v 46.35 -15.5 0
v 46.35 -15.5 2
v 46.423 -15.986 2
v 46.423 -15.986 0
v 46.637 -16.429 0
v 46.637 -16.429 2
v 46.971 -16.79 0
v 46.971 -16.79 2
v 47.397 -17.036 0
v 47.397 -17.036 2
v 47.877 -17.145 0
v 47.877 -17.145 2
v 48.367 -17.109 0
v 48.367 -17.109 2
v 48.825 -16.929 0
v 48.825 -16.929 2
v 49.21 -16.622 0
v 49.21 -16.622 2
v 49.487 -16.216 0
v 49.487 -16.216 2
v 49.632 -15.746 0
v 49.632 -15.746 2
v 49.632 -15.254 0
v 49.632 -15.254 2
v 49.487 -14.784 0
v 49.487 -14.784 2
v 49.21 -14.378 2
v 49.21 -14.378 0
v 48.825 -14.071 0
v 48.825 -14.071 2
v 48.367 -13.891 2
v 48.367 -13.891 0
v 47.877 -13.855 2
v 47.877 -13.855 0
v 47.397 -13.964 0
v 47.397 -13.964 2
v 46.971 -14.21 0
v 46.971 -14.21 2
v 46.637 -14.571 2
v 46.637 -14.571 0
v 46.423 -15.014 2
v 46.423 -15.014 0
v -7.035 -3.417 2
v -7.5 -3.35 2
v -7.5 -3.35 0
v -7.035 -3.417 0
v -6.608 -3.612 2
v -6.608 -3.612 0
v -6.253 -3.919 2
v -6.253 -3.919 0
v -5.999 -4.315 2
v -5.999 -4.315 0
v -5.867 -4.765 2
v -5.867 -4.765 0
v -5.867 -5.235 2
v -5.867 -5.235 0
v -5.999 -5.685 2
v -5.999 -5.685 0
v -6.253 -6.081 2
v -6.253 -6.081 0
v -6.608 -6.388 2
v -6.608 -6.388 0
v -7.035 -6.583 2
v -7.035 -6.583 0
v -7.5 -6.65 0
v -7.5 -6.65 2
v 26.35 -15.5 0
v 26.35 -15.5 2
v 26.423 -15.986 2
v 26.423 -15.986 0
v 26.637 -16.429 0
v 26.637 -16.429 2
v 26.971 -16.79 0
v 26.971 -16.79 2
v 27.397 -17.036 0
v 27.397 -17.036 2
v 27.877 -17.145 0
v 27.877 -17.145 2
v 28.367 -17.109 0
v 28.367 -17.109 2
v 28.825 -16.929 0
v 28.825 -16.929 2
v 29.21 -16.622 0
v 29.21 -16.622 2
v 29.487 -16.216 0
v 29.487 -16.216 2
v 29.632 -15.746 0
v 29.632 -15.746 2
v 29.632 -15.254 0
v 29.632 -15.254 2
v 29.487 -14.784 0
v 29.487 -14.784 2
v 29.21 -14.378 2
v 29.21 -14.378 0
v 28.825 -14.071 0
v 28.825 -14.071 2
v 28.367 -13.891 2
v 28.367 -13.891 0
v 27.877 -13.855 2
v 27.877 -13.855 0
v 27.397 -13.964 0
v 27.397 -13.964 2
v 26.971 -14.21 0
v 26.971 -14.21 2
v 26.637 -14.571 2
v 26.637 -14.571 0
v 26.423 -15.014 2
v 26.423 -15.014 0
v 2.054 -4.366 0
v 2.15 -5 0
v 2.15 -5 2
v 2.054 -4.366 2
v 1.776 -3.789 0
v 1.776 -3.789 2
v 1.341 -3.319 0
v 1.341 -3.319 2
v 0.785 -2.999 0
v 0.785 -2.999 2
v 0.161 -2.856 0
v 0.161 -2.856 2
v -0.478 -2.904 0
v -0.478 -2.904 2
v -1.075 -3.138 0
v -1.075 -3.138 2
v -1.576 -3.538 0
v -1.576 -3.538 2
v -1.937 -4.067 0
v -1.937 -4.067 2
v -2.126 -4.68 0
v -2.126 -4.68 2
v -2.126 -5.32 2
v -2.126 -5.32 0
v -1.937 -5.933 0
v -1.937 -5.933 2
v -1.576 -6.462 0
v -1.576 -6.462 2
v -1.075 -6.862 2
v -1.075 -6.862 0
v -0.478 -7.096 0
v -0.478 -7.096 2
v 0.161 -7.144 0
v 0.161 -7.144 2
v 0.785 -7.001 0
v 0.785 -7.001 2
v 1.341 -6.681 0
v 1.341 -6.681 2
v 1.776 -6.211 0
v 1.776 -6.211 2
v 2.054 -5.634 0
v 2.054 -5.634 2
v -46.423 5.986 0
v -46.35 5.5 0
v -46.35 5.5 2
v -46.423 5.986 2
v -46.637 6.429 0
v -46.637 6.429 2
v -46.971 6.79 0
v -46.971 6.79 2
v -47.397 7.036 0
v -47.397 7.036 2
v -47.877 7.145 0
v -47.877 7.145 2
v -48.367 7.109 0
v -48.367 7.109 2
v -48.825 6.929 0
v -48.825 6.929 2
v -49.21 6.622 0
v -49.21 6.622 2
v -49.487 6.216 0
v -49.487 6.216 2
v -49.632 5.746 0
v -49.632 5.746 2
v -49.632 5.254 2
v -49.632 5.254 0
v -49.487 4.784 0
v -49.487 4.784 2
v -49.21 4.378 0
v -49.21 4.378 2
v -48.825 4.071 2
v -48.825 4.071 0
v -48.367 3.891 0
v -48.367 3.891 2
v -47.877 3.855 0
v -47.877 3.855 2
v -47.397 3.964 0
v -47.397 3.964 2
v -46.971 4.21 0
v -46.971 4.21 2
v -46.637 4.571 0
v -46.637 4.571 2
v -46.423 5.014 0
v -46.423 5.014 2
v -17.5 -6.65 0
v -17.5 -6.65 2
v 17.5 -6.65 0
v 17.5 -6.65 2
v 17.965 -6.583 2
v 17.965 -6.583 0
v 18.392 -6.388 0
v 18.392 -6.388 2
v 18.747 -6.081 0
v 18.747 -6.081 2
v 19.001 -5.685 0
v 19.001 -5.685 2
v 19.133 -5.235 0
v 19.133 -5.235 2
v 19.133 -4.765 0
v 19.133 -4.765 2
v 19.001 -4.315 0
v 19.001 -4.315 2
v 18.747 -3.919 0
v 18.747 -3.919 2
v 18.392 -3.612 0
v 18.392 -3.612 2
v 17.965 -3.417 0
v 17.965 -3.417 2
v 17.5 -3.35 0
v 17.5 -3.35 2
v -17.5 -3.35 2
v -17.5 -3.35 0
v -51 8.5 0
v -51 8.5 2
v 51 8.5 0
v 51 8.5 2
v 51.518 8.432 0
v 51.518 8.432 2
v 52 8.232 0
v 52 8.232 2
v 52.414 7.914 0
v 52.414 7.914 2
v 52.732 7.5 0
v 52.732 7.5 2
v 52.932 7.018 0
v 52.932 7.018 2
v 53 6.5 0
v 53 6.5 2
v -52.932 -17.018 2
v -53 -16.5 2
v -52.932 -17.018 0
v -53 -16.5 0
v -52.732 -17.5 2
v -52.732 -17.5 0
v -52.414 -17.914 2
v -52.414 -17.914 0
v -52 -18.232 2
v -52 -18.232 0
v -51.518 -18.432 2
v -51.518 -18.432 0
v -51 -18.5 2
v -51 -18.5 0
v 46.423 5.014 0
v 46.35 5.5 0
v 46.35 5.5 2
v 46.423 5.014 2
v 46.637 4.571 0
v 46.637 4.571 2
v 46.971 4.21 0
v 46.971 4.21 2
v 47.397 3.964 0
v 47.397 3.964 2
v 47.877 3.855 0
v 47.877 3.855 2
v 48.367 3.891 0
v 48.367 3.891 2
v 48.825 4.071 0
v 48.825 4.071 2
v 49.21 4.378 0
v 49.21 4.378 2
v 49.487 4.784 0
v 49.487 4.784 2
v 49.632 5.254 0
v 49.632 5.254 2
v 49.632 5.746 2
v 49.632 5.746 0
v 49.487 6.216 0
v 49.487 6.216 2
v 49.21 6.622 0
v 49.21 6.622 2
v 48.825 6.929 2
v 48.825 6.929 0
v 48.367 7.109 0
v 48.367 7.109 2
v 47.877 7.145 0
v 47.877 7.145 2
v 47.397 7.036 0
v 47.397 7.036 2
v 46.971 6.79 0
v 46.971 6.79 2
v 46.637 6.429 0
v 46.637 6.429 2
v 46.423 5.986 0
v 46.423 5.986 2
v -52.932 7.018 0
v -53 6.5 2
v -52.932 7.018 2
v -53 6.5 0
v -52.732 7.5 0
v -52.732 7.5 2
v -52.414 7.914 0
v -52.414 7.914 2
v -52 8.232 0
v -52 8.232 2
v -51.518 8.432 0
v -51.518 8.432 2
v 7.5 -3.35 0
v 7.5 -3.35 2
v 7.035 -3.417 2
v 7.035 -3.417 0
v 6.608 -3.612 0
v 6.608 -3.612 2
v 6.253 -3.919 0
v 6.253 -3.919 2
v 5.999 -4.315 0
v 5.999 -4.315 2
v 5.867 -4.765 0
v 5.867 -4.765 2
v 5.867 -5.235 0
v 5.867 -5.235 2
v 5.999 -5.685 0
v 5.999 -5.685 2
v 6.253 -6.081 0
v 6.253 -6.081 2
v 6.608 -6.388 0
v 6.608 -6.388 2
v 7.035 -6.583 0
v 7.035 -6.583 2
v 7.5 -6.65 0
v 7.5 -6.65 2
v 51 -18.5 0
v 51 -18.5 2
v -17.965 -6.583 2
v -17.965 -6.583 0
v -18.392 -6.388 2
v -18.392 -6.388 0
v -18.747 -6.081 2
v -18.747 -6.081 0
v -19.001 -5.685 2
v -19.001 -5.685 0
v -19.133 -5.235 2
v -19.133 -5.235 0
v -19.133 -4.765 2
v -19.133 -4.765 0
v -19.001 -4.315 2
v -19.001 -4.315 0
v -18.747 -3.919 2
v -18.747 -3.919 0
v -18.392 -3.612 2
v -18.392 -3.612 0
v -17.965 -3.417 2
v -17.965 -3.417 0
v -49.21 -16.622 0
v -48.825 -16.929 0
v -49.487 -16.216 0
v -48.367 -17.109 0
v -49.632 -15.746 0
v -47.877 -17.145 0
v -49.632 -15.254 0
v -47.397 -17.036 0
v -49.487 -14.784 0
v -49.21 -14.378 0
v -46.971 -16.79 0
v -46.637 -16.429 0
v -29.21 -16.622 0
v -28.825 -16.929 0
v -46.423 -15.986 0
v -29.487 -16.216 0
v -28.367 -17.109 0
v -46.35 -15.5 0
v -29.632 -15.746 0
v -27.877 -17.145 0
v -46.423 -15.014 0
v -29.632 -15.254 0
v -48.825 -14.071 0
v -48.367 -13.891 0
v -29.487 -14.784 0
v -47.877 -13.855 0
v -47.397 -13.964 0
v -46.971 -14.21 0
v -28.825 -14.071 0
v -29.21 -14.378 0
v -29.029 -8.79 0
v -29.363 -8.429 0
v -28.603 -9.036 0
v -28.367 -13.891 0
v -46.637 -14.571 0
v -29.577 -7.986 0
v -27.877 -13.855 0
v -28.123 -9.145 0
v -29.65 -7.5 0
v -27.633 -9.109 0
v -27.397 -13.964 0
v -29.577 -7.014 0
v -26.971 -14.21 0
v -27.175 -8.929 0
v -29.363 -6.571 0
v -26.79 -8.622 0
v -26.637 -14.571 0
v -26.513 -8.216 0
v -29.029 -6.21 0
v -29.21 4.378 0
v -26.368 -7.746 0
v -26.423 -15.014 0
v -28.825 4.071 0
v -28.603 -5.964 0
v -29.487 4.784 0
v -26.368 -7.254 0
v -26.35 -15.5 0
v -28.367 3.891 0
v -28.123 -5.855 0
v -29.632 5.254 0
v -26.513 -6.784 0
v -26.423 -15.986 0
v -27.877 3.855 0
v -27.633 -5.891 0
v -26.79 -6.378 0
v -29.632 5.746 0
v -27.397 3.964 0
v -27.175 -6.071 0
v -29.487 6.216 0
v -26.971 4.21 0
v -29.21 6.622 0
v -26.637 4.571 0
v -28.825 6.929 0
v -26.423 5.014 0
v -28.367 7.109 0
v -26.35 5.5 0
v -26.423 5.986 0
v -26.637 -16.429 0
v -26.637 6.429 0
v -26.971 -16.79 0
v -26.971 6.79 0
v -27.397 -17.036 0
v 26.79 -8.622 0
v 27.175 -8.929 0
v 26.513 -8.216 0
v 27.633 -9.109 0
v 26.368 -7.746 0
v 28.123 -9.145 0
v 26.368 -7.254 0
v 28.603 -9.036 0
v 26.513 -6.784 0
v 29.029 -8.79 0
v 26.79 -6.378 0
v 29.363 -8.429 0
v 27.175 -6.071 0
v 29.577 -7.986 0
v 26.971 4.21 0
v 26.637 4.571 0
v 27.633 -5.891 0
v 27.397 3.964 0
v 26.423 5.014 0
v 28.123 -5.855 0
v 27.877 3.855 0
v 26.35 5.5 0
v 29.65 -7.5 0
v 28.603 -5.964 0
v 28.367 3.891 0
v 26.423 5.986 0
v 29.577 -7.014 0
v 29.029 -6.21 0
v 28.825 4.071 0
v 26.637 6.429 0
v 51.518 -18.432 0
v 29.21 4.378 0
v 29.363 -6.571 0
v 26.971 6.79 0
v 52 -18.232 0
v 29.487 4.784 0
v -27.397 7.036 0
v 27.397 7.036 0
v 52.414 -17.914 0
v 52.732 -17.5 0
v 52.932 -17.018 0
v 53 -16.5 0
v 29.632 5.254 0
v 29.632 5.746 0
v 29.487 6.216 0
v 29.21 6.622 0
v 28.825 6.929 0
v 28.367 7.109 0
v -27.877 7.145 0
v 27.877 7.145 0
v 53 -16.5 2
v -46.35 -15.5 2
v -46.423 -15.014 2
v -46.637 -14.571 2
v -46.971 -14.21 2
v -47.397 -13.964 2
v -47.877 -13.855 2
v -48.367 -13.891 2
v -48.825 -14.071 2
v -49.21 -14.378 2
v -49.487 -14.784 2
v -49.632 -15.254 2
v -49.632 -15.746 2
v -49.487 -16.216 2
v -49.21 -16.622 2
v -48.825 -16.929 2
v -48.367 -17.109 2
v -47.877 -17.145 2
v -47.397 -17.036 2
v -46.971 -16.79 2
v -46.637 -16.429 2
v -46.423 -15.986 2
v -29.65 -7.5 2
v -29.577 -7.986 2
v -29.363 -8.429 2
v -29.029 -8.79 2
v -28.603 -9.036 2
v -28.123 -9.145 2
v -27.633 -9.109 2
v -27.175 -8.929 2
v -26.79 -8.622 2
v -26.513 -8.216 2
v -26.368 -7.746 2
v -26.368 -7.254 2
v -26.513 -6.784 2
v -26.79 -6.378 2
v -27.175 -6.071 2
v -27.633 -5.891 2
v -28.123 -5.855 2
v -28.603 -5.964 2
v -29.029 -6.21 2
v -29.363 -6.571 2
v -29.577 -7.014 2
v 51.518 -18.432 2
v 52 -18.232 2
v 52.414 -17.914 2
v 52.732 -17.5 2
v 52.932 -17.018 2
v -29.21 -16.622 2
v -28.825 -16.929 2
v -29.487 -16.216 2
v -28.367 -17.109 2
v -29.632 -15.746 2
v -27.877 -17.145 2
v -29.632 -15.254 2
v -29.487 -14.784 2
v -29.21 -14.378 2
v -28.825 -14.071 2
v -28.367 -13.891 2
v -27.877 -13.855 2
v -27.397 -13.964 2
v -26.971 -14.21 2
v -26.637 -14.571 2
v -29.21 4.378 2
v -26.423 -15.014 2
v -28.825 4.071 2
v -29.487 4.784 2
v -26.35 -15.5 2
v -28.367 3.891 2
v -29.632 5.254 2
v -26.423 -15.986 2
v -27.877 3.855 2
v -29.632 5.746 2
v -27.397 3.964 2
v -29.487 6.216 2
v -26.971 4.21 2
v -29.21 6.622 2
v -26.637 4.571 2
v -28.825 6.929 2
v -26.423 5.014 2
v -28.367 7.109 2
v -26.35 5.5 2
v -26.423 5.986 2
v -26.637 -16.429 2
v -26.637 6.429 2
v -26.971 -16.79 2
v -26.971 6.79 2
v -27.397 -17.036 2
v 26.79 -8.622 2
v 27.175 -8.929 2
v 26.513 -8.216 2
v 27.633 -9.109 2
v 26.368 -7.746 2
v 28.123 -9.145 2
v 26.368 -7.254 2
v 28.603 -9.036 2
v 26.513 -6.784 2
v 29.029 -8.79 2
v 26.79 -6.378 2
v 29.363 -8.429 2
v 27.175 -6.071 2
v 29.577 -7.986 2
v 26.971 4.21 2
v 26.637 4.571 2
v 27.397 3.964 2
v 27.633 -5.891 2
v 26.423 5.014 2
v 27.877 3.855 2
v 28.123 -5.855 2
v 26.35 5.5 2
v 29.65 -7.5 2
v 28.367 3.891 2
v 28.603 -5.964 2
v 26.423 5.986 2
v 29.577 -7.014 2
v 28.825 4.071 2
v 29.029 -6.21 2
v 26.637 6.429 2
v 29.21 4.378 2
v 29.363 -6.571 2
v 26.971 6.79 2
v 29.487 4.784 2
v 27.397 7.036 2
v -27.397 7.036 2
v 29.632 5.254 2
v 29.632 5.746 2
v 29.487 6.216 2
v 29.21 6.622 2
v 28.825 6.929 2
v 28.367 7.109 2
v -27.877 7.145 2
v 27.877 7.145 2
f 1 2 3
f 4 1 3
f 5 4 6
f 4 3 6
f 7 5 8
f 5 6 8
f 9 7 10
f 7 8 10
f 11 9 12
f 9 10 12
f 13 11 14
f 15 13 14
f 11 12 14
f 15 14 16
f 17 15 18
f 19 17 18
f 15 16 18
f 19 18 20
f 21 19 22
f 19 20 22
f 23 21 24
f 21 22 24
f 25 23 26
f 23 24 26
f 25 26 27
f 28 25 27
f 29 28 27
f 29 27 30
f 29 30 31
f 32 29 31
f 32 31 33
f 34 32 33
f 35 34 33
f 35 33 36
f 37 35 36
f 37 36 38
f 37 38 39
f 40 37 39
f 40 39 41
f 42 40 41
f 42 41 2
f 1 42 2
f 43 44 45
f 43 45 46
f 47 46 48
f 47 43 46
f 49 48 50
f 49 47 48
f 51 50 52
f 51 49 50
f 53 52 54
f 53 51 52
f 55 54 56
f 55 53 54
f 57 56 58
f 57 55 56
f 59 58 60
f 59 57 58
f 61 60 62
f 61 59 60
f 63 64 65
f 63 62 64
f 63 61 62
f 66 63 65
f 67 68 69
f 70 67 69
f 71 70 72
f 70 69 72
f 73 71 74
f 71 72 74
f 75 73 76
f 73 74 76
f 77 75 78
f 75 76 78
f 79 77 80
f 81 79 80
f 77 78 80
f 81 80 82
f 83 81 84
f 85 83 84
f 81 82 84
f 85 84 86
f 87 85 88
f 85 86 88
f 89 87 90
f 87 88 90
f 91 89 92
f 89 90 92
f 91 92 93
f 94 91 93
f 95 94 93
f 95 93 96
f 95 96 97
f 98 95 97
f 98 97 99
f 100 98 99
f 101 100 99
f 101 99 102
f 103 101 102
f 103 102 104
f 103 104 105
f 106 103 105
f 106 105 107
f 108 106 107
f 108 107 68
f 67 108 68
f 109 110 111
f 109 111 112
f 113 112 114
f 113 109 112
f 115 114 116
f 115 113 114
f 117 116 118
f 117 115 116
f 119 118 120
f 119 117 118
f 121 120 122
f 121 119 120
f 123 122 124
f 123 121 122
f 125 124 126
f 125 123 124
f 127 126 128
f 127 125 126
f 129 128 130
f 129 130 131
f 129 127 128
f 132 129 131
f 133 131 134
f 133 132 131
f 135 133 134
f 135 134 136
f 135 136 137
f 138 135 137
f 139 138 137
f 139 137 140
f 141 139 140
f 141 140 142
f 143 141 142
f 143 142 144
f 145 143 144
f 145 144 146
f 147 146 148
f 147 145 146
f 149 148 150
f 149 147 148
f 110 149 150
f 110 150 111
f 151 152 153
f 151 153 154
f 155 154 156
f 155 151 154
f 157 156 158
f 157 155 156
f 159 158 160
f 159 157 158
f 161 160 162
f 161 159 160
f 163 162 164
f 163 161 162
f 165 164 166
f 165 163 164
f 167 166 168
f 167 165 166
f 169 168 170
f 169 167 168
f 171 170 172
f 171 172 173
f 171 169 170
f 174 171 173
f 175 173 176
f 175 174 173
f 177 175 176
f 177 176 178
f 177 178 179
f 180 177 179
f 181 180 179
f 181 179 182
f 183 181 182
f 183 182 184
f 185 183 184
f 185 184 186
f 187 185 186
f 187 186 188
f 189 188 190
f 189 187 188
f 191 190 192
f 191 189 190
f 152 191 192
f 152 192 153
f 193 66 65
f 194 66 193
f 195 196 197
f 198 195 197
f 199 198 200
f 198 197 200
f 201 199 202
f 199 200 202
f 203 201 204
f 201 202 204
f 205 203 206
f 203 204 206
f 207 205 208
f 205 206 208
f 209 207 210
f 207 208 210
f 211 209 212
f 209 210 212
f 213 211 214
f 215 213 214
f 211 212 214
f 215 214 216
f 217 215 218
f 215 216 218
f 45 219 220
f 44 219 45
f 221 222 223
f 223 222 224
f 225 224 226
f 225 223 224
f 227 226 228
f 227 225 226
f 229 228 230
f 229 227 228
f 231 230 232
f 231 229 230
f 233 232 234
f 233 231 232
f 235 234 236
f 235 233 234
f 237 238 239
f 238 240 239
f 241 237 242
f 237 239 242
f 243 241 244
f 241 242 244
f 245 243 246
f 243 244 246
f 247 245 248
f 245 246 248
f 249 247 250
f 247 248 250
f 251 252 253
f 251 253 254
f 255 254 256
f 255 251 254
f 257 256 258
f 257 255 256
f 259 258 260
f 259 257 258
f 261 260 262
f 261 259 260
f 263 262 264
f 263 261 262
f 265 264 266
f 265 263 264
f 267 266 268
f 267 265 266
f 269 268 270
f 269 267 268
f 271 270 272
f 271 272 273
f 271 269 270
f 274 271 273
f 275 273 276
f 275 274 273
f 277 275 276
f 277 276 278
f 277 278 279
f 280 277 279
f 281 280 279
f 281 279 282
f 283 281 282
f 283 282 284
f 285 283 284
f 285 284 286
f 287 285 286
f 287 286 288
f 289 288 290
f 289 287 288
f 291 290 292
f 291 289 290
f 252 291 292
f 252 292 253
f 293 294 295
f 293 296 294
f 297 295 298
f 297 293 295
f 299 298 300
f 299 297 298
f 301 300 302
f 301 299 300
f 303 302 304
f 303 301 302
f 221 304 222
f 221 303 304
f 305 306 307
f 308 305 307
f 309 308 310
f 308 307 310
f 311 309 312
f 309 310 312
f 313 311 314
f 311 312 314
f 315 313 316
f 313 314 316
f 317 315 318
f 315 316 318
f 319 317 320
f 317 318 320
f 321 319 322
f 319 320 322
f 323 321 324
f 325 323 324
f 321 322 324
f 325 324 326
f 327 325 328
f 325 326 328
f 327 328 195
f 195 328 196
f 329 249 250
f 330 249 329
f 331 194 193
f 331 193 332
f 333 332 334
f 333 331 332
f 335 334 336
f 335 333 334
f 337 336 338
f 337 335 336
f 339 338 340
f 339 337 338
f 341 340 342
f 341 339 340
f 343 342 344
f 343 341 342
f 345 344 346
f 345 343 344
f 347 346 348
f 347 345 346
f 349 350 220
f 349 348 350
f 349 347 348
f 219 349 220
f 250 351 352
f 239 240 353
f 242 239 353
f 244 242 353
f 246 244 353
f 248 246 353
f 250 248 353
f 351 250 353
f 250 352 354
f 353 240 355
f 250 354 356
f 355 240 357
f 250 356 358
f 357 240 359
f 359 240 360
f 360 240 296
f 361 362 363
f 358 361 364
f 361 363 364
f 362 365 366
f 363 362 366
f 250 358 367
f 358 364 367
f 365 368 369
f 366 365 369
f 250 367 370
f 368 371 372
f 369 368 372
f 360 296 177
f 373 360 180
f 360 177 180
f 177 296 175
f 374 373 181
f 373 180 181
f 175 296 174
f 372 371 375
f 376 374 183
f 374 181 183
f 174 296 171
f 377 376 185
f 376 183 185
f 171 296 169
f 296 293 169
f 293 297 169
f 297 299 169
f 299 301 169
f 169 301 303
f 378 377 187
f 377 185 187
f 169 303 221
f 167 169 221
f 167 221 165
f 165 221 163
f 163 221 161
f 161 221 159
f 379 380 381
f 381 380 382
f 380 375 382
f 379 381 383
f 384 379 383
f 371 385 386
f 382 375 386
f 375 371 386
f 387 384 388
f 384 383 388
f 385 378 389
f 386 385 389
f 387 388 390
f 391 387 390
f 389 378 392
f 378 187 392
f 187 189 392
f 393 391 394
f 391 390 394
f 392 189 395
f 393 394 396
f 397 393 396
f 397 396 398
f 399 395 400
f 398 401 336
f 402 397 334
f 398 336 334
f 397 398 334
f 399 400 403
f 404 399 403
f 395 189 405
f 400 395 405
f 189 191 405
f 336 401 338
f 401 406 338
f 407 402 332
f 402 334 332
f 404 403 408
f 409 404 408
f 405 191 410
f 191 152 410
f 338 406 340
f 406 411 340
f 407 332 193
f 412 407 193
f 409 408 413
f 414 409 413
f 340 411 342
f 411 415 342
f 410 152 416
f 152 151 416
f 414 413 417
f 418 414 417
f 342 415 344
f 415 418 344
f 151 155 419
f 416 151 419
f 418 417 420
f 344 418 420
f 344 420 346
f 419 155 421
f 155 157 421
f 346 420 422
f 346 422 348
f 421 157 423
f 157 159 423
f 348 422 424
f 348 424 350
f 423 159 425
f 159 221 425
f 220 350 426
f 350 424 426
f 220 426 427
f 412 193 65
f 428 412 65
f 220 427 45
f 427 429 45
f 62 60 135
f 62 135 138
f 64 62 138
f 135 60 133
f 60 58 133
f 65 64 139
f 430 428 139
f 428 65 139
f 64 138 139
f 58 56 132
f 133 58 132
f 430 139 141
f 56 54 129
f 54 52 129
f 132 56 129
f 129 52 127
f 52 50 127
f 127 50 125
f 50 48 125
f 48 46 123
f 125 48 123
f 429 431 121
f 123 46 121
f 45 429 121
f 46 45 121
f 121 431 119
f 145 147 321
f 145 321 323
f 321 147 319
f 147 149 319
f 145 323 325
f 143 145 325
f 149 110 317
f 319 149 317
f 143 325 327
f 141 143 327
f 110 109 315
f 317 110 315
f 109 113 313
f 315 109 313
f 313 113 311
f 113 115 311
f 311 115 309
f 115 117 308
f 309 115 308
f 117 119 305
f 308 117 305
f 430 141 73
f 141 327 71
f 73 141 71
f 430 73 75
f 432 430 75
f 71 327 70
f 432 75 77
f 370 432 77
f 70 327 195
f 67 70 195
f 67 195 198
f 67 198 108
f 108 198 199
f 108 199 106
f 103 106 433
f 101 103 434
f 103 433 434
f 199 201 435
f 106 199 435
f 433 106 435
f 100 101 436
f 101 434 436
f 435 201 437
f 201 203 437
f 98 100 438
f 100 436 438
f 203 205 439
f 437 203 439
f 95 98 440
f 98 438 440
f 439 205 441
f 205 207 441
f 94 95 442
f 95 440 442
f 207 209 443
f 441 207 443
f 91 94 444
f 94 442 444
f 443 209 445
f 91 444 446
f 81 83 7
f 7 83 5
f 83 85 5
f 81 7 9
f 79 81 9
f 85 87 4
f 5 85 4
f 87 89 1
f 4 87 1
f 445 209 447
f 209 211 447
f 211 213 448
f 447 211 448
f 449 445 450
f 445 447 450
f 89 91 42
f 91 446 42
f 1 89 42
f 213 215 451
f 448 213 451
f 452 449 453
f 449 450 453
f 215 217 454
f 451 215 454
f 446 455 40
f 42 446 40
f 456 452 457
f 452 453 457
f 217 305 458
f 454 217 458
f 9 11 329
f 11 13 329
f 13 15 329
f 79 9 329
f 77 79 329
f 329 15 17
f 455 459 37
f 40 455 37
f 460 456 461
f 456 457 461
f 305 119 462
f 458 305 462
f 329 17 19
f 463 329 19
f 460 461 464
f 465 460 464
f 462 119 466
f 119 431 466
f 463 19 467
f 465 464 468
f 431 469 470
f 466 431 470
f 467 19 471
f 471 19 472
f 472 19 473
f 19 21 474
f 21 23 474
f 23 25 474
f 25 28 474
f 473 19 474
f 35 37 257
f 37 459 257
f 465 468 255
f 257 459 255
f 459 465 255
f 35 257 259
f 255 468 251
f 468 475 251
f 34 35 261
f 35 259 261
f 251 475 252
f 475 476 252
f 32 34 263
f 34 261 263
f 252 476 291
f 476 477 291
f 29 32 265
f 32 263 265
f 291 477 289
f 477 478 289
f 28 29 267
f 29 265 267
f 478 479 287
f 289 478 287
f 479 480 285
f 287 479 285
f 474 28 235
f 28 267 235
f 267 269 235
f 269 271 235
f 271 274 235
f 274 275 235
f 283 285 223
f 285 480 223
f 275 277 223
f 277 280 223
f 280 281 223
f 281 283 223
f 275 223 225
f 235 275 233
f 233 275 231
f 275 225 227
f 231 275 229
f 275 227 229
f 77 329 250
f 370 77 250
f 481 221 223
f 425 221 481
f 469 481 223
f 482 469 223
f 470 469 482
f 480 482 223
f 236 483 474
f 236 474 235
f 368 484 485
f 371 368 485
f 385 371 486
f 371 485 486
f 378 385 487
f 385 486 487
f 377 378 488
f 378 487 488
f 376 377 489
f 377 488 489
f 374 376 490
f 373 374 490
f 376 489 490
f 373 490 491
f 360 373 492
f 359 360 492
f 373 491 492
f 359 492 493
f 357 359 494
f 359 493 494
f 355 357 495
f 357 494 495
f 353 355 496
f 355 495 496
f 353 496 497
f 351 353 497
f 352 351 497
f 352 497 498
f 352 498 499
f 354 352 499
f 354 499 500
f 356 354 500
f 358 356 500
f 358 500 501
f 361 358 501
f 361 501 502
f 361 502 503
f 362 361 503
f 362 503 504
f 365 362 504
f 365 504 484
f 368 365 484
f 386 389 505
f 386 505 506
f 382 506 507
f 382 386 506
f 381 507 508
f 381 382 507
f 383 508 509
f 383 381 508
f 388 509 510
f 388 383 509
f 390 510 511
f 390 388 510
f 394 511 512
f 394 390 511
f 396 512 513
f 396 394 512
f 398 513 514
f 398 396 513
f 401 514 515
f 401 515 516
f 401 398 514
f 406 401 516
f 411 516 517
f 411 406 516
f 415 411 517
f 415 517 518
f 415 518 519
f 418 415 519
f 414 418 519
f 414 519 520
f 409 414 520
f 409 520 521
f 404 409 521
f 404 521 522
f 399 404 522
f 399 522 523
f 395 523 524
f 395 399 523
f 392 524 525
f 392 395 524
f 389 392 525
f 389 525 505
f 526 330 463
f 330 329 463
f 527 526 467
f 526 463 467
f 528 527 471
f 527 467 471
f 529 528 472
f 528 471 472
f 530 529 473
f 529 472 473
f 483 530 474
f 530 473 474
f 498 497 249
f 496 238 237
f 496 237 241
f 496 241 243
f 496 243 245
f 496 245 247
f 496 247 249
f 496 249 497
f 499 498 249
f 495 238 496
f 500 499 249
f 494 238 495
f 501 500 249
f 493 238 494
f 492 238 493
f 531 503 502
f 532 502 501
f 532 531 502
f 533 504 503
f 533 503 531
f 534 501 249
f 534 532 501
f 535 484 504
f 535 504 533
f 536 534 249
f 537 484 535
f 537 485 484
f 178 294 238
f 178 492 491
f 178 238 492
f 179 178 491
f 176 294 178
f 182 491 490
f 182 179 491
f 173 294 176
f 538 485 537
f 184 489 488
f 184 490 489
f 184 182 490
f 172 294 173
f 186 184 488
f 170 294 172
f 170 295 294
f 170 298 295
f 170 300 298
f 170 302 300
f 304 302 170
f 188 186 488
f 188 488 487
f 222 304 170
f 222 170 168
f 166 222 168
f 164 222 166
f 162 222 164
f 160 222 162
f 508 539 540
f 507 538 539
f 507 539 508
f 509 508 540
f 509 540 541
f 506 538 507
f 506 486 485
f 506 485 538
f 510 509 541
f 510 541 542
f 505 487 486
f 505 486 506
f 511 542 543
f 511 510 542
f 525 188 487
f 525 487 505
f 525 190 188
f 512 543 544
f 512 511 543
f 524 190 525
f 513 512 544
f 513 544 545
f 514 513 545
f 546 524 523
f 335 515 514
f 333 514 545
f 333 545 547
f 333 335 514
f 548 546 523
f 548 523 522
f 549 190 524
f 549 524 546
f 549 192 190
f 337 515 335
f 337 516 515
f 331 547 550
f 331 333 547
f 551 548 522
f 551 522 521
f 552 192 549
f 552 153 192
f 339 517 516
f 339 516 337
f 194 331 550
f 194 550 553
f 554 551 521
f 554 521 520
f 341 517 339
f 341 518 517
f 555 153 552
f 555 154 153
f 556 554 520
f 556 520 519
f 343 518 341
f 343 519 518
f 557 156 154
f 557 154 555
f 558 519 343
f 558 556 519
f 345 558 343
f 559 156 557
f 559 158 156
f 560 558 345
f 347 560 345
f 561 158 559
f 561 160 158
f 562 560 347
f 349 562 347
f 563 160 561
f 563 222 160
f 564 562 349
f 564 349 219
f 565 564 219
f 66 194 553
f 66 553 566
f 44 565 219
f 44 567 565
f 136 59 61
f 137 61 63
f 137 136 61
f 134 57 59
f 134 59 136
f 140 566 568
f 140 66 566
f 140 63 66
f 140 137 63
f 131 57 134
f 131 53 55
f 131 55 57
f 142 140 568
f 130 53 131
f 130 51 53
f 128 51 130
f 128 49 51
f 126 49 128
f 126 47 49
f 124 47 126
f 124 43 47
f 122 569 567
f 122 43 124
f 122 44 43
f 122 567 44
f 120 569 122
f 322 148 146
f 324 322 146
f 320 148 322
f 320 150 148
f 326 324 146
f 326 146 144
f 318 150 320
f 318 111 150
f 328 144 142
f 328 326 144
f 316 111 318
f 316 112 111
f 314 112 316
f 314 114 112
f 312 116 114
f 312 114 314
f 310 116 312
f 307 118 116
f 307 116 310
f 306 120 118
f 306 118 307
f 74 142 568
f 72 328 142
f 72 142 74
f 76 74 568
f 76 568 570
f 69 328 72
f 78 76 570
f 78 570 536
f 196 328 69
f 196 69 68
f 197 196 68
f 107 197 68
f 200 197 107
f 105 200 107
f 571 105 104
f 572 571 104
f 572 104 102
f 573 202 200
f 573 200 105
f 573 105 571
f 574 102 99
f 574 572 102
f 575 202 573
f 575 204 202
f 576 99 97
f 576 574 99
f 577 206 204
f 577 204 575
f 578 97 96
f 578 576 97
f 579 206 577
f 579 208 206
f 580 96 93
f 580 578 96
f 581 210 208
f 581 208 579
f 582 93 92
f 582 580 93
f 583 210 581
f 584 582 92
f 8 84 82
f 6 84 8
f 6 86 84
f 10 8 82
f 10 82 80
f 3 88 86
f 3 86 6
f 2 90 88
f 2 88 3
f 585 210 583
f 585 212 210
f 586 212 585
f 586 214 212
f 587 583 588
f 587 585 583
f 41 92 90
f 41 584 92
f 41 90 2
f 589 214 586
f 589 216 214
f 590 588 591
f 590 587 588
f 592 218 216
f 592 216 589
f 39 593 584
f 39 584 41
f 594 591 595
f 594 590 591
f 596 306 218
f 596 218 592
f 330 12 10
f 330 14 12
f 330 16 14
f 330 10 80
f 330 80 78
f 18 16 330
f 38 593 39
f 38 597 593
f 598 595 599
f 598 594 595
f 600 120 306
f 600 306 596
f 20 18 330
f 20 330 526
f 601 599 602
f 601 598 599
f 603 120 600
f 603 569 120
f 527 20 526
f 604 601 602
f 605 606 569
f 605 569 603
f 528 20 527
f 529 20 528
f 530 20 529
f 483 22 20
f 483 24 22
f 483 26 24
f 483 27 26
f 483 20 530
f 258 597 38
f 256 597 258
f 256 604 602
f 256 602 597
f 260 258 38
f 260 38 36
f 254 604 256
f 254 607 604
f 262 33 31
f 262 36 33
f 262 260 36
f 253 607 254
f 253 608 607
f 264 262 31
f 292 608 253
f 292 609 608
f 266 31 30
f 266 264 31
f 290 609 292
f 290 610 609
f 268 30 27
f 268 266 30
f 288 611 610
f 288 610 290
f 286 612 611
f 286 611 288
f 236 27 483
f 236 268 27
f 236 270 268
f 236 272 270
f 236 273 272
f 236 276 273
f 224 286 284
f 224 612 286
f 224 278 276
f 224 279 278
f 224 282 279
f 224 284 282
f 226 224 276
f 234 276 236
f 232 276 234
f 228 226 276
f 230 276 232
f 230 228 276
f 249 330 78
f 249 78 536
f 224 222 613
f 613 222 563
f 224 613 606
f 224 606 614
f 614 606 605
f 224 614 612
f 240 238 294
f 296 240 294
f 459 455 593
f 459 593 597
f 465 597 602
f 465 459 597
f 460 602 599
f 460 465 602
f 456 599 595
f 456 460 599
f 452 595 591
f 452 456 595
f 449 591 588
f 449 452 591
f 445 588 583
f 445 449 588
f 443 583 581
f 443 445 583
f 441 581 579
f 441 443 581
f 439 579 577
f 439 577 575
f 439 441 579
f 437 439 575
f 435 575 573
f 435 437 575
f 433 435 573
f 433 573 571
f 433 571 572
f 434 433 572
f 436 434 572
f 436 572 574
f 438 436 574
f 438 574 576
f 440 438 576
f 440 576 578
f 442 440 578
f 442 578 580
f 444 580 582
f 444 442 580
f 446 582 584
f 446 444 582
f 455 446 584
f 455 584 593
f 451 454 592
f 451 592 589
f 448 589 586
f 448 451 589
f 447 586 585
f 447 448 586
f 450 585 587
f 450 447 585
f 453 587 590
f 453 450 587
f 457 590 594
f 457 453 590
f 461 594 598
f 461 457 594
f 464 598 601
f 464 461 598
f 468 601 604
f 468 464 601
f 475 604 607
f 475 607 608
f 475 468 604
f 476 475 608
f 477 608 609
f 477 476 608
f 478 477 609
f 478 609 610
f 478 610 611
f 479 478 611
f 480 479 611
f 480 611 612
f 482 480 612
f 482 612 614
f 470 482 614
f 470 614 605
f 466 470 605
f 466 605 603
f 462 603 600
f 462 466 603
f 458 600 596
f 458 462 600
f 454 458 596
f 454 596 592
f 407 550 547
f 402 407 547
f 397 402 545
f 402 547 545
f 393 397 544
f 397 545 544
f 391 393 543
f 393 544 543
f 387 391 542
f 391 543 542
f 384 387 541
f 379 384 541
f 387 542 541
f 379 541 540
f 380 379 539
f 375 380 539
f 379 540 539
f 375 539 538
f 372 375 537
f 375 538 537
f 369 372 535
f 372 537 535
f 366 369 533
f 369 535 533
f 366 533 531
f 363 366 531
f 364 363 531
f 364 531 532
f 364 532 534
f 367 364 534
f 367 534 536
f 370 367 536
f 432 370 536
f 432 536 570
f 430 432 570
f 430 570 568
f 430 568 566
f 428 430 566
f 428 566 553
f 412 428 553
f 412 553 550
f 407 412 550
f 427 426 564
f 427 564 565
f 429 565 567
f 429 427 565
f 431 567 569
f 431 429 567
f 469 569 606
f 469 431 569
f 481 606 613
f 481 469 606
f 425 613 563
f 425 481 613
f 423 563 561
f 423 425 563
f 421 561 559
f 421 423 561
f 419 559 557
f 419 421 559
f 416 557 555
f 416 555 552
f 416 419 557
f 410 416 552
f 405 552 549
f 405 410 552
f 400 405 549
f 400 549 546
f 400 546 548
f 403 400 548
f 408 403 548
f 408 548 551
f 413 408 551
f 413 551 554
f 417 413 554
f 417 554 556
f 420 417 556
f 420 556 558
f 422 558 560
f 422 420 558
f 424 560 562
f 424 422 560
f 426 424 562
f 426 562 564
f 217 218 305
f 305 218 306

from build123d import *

# Parameters (mm, degrees)
SKETCH_1_W          = 106
SKETCH_1_H          = 25
SKETCH_1_R          = 1.65
SKETCH_1_R_2        = 2.15
EXTRUDE_1_DEPTH     = 2
SKETCH_2_W          = 106
SKETCH_2_H          = 6
EXTRUDE_3_DEPTH     = 2
SKETCH_4_R          = 1.65
CUT_EXTRUDE_1_DEPTH = 57.171612047
CUT_EXTRUDE_2_DEPTH = 10
SKETCH_6_W          = 106
SKETCH_6_H          = 4
CUT_EXTRUDE_3_DEPTH = 57.171612047
FILLET_1_R          = 2


with BuildPart() as part:
    # 草图1 → 凸台-拉伸1 (new body)
    with BuildSketch(Plane.XY):
        Rectangle(SKETCH_1_W, SKETCH_1_H)
        with Locations((-28, 5.5)):
            Circle(SKETCH_1_R, mode=Mode.SUBTRACT)
        with Locations(Location((-28, -7.5, 0), (0, 0, 180))):
            Circle(SKETCH_1_R, mode=Mode.SUBTRACT)
        with Locations((28, -7.5)):
            Circle(SKETCH_1_R, mode=Mode.SUBTRACT)
        with Locations(Location((28, 5.5, 0), (0, 0, 180))):
            Circle(SKETCH_1_R, mode=Mode.SUBTRACT)
        with Locations((-48, 5.5)):
            Circle(SKETCH_1_R, mode=Mode.SUBTRACT)
        with Locations(Location((48, 5.5, 0), (0, 0, 180))):
            Circle(SKETCH_1_R, mode=Mode.SUBTRACT)
        with Locations((0, -5)):
            Circle(SKETCH_1_R_2, mode=Mode.SUBTRACT)
    extrude(amount=EXTRUDE_1_DEPTH)

    # 草图2 → 凸台-拉伸3 (add)
    with BuildSketch(Plane.XY.offset(2)):
        with Locations((0, -15.5)):
            Rectangle(SKETCH_2_W, SKETCH_2_H)
    extrude(amount=-EXTRUDE_3_DEPTH)

    # 草图4 → 切除-拉伸1 (cut, through all)
    with BuildSketch(Plane.XY.offset(2)):
        with Locations((-48, -15.5)):
            Circle(SKETCH_4_R)
        with Locations(Location((48, -15.5, 0), (0, 0, 180))):
            Circle(SKETCH_4_R)
        with Locations((-28, -15.5)):
            Circle(SKETCH_4_R)
        with Locations(Location((28, -15.5, 0), (0, 0, 180))):
            Circle(SKETCH_4_R)
    extrude(amount=-CUT_EXTRUDE_1_DEPTH, mode=Mode.SUBTRACT)

    # 草图5 → 切除-拉伸2 (cut)
    with BuildSketch(Plane.XY.offset(2)):
        with BuildLine():
            Line((-17.5, -3.35), (-7.5, -3.35))
            ThreePointArc((-7.5, -3.35), (-5.85, -5), (-7.5, -6.65))
            Line((-7.5, -6.65), (-17.5, -6.65))
            ThreePointArc((-17.5, -6.65), (-19.15, -5), (-17.5, -3.35))
        make_face()
        with BuildLine():
            Line((17.5, -3.35), (7.5, -3.35))
            ThreePointArc((7.5, -3.35), (5.85, -5), (7.5, -6.65))
            Line((7.5, -6.65), (17.5, -6.65))
            ThreePointArc((17.5, -6.65), (19.15, -5), (17.5, -3.35))
        make_face()
    extrude(amount=-CUT_EXTRUDE_2_DEPTH, mode=Mode.SUBTRACT)

    # 草图6 → 切除-拉伸3 (cut, through all)
    with BuildSketch(Plane.XY.offset(2)):
        with Locations((0, 10.5)):
            Rectangle(SKETCH_6_W, SKETCH_6_H)
    extrude(amount=-CUT_EXTRUDE_3_DEPTH, mode=Mode.SUBTRACT)

    # 圆角1
    fillet_1_edges = [part.edges().sort_by_distance(p)[0] for p in [
        (-53, 8.5, 1),
        (53, 8.5, 1),
        (-53, -18.5, 1),
        (53, -18.5, 1),
    ]]
    fillet(fillet_1_edges, radius=FILLET_1_R)


solid = part.part
